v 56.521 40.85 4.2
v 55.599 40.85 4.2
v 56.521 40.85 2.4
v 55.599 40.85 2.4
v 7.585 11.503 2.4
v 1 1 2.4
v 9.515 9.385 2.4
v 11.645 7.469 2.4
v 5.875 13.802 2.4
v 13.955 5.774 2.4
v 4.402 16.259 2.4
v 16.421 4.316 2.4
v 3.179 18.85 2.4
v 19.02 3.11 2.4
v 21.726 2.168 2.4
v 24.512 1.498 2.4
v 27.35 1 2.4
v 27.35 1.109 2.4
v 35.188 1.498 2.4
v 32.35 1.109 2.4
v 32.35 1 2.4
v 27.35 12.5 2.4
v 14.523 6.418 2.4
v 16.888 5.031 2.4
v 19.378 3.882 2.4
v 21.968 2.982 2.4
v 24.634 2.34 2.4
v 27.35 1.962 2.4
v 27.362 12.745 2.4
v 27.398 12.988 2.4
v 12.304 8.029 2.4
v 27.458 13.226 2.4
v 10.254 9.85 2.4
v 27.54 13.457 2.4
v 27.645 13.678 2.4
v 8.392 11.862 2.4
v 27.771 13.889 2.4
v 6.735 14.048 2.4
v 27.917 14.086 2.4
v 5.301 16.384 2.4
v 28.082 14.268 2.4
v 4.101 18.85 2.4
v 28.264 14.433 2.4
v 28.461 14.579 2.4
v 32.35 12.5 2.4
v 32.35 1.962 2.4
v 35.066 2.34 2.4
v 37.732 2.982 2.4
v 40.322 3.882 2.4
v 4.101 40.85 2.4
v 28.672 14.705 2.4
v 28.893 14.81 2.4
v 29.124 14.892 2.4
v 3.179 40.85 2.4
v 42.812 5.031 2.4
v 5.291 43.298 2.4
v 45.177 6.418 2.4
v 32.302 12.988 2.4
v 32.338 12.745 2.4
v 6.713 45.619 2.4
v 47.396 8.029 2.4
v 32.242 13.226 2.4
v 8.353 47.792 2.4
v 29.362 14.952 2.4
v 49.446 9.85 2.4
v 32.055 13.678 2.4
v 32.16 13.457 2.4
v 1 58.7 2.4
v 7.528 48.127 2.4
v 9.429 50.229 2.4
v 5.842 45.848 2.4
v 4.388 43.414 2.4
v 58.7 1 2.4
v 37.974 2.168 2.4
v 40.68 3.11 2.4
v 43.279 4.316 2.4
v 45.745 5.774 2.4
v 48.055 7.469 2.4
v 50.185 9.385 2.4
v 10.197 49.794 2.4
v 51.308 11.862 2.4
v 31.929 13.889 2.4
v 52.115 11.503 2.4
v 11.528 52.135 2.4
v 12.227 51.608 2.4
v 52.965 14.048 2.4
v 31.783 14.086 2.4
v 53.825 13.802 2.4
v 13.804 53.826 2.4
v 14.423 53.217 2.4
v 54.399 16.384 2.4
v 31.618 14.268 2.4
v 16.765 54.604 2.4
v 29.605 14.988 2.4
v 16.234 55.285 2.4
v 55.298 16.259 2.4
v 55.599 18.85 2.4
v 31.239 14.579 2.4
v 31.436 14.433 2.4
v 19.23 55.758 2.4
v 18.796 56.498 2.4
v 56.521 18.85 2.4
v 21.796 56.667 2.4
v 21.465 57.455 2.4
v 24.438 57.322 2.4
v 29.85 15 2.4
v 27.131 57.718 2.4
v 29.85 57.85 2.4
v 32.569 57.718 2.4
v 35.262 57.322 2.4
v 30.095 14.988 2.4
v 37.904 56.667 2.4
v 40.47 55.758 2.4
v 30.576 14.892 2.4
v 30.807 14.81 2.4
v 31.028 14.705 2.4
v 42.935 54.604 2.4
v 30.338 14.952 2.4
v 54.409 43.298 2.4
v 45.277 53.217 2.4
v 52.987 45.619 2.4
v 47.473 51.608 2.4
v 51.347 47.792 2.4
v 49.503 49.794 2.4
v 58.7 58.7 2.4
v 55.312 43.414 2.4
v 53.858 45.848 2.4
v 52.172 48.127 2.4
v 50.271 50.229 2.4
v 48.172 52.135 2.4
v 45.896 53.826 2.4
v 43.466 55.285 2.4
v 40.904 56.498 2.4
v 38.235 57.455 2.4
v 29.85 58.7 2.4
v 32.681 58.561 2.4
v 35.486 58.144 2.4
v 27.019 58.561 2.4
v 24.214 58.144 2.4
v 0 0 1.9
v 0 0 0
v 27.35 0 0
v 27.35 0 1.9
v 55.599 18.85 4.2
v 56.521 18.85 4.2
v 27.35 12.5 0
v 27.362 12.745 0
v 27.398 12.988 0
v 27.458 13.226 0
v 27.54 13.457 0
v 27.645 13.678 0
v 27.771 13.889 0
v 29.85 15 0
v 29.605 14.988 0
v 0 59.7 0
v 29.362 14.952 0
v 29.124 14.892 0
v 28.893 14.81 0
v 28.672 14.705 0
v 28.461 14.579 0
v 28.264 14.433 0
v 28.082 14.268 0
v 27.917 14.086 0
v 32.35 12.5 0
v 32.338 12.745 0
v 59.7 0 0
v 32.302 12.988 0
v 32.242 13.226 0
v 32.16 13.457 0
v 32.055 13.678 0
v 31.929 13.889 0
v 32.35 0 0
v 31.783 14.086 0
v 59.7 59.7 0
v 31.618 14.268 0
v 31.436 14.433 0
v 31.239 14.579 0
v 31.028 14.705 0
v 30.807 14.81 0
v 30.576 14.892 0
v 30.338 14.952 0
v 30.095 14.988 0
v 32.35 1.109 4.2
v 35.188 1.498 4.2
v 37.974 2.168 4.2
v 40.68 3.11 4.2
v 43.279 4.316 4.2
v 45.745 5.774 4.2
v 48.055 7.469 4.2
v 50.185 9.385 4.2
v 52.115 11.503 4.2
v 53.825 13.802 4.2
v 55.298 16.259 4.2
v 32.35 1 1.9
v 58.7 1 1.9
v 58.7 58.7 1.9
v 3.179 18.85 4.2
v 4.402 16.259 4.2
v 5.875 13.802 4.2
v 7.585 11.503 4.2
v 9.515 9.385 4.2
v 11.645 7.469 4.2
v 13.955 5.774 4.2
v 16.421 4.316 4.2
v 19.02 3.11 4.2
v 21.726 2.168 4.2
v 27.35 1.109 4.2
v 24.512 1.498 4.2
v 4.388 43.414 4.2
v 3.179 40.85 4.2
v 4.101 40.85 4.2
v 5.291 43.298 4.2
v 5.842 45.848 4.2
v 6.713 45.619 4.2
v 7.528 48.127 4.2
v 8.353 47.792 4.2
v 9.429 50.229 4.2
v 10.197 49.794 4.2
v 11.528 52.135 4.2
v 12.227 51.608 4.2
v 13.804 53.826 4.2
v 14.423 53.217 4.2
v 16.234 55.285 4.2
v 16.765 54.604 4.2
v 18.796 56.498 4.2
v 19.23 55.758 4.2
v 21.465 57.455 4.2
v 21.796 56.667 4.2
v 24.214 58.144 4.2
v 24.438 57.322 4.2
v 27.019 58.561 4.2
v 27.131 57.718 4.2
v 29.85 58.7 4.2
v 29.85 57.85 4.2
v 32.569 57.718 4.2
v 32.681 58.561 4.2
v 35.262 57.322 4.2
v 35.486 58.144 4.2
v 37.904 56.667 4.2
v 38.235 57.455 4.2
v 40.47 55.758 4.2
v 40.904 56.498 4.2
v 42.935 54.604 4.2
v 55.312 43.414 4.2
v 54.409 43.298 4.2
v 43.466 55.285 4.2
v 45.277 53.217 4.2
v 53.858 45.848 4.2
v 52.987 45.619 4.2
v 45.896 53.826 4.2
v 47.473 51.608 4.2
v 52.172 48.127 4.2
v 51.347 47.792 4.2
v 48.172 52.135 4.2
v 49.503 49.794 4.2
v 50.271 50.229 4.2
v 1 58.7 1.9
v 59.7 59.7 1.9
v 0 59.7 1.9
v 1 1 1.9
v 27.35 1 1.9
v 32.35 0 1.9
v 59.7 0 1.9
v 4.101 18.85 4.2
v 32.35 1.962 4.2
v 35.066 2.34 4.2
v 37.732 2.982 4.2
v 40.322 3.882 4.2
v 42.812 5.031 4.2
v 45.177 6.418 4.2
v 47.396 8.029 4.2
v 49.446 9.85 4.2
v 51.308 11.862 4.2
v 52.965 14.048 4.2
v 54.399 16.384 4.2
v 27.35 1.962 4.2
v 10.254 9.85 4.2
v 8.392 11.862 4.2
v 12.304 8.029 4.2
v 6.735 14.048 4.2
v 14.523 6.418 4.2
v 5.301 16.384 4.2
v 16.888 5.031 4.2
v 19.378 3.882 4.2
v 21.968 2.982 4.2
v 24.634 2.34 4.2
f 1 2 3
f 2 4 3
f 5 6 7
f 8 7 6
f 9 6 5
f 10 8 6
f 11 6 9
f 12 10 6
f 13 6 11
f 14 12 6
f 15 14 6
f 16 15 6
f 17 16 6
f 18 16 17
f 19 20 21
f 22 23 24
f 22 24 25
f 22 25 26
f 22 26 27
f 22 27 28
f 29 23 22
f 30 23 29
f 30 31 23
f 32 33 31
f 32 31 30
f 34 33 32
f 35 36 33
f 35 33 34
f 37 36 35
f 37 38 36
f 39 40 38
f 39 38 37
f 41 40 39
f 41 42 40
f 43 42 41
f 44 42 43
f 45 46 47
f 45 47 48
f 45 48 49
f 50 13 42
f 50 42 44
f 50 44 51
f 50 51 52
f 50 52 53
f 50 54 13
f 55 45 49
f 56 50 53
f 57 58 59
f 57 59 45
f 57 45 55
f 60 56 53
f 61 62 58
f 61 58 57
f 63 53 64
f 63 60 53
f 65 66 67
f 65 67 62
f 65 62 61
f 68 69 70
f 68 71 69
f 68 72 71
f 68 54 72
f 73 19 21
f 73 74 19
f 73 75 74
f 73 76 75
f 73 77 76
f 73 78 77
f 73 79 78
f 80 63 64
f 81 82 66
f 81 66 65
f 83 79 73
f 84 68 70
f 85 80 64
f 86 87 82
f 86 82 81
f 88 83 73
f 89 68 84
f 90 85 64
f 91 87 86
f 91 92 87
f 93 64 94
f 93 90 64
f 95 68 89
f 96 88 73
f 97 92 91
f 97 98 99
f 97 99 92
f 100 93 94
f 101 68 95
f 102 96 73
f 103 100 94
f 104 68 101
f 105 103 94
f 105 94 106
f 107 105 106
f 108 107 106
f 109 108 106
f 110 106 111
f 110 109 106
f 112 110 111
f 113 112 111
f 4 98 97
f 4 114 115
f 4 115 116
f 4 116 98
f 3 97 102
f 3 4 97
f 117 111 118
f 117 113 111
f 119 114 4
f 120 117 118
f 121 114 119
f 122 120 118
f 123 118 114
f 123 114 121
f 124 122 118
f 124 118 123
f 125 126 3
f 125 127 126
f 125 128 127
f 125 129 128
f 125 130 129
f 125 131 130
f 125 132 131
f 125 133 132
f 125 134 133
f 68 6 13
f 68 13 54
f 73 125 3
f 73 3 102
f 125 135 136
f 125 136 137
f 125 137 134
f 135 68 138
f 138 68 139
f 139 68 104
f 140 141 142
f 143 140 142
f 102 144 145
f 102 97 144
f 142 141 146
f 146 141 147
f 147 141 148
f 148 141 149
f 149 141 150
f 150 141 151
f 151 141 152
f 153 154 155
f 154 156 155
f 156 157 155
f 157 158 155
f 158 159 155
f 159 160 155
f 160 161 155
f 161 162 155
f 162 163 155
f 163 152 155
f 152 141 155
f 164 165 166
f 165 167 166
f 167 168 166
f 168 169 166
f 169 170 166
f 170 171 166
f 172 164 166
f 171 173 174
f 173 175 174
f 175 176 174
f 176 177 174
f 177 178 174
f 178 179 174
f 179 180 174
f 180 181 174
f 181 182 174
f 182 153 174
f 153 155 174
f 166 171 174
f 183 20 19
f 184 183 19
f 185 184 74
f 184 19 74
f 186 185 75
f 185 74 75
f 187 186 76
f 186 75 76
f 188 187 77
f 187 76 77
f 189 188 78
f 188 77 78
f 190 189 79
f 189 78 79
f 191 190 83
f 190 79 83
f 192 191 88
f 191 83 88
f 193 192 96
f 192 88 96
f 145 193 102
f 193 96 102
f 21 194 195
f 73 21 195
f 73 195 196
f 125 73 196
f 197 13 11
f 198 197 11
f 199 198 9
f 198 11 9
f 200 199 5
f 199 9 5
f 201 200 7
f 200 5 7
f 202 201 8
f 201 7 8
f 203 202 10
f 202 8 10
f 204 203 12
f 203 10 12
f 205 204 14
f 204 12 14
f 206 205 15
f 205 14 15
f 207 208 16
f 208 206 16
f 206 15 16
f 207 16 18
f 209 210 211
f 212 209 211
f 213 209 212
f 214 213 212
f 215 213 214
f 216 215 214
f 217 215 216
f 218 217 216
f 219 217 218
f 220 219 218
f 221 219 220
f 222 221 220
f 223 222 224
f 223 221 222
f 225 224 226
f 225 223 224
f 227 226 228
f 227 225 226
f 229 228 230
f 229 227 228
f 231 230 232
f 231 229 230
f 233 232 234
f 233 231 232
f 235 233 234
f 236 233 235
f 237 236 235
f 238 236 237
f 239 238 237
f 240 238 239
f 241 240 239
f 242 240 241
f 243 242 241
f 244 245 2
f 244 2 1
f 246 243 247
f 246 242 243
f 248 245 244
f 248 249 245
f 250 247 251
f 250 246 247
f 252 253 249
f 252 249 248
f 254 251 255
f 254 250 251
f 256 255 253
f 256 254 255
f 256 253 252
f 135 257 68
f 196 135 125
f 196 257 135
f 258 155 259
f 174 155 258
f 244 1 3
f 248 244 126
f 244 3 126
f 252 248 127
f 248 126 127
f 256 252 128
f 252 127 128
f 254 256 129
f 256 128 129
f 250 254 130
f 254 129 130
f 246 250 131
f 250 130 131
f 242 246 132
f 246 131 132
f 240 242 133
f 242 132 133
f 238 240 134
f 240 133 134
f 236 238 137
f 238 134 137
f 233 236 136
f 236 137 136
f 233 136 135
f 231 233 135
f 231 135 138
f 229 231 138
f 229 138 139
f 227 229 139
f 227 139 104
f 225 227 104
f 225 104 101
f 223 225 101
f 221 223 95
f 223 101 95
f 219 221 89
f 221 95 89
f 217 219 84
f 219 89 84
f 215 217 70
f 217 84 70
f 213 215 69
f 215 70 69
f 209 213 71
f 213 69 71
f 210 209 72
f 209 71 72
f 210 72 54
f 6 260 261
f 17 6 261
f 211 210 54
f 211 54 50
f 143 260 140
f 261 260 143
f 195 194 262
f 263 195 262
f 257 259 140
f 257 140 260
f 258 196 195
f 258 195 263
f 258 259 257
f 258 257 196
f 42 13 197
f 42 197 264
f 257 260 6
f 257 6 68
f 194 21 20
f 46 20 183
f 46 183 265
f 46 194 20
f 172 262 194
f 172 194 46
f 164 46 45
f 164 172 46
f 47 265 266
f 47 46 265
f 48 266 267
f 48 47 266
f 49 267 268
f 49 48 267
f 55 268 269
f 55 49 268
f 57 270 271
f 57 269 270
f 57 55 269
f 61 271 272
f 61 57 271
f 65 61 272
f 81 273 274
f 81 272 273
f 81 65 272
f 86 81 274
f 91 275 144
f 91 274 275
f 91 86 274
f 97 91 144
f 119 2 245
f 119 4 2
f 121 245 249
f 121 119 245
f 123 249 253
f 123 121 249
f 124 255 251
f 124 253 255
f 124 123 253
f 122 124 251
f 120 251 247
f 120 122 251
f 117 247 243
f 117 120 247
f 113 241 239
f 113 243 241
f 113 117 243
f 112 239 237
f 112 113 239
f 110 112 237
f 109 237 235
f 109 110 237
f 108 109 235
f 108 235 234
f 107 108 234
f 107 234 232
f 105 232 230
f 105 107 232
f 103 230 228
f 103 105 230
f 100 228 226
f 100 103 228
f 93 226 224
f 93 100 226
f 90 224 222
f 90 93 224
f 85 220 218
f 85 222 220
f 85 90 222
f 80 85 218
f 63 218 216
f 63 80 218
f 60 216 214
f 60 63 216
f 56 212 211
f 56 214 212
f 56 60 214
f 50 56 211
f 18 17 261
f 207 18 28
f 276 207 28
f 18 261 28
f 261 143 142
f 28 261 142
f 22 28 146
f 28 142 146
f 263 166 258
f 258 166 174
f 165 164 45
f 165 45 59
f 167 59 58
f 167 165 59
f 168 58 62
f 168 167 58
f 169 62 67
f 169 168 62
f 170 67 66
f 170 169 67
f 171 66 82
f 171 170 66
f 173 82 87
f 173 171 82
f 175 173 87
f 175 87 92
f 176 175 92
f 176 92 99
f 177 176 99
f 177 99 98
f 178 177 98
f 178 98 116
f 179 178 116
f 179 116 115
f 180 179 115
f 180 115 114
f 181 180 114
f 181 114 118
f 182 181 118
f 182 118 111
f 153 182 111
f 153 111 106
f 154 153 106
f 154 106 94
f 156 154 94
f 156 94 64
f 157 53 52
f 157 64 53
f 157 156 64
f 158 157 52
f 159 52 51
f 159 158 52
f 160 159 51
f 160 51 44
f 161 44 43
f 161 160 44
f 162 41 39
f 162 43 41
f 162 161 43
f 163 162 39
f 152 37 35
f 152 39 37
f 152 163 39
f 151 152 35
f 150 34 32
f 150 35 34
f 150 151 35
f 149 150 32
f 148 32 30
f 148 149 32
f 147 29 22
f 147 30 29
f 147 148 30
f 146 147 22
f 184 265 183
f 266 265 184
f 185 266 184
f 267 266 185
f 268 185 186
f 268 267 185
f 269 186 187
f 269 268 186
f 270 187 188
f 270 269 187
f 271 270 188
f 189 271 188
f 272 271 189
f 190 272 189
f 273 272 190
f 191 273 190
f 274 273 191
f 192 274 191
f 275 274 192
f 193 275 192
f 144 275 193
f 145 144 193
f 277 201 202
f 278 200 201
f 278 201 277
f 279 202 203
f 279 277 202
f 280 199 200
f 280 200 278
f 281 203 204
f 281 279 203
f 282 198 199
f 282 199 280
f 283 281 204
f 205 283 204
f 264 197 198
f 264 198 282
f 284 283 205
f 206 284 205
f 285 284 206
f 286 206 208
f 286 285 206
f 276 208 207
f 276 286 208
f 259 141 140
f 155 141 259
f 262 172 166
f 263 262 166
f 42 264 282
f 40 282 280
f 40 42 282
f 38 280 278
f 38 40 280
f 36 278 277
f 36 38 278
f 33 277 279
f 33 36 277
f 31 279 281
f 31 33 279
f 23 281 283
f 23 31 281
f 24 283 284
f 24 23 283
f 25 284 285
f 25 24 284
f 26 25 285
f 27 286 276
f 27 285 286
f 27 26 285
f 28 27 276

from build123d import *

# Parameters (mm, degrees)
CYLINDER002_R     = 2.5
CYLINDER002_DEPTH = 5
BOX024_W          = 5
BOX024_H          = 12.5
BOX024_DEPTH      = 5
BOX001_W          = 57.7
BOX001_H          = 57.7
BOX001_DEPTH      = 0.5
BOX_W             = 59.7
BOX_H             = 59.7
BOX_DEPTH         = 1.9
BOX003_W          = 5
BOX003_H          = 22
BOX003_DEPTH      = 2.5
BOX002_W          = 5
BOX002_H          = 22
BOX002_DEPTH      = 2.5
CYLINDER001_R     = 28
CYLINDER001_DEPTH = 1.8
CYLINDER_R        = 28.85
CYLINDER_DEPTH    = 1.8


with BuildPart() as cylinder001:
    # Cylinder002 → Cylinder002 (new body)
    with BuildSketch(Plane(origin=(29.85, 12.5, 0), x_dir=(1, 0, 0), z_dir=(0, 0, 1))):
        Circle(CYLINDER002_R)
    extrude(amount=CYLINDER002_DEPTH)


with BuildPart() as cube:
    # Box024 → Box024 (new body)
    with BuildSketch(Plane(origin=(27.35, 0, 0), x_dir=(1, 0, 0), z_dir=(0, 0, 1))):
        with Locations((2.5, 6.25)):
            Rectangle(BOX024_W, BOX024_H)
    extrude(amount=BOX024_DEPTH)


with BuildPart() as layer_inside_base:
    # Box001 → Box001 (new body)
    with BuildSketch(Plane(origin=(1, 1, 1.9), x_dir=(1, 0, 0), z_dir=(0, 0, 1))):
        with Locations((28.85, 28.85)):
            Rectangle(BOX001_W, BOX001_H)
    extrude(amount=BOX001_DEPTH)


with BuildPart() as plate:
    # Box → Box (new body)
    with BuildSketch(Plane.XY):
        with Locations((29.85, 29.85)):
            Rectangle(BOX_W, BOX_H)
    extrude(amount=BOX_DEPTH)

    # Fusion: union Layer_Inside_Base
    add(layer_inside_base.part)


with BuildPart() as box003:
    # Box003 → Box003 (new body)
    with BuildSketch(Plane(origin=(54.7, 18.85, 1.9), x_dir=(1, 0, 0), z_dir=(0, 0, 1))):
        with Locations((2.5, 11)):
            Rectangle(BOX003_W, BOX003_H)
    extrude(amount=BOX003_DEPTH)


with BuildPart() as box002:
    # Box002 → Box002 (new body)
    with BuildSketch(Plane(origin=(0, 18.85, 1.9), x_dir=(1, 0, 0), z_dir=(0, 0, 1))):
        with Locations((2.5, 11)):
            Rectangle(BOX002_W, BOX002_H)
    extrude(amount=BOX002_DEPTH)


with BuildPart() as cylinder_inside:
    # Cylinder001 → Cylinder001 (new body)
    with BuildSketch(Plane(origin=(29.85, 29.85, 2.4), x_dir=(1, 0, 0), z_dir=(0, 0, 1))):
        Circle(CYLINDER001_R)
    extrude(amount=CYLINDER001_DEPTH)


with BuildPart() as cut006:
    # Cylinder → Cylinder (new body)
    with BuildSketch(Plane(origin=(29.85, 29.85, 2.4), x_dir=(1, 0, 0), z_dir=(0, 0, 1))):
        Circle(CYLINDER_R)
    extrude(amount=CYLINDER_DEPTH)

    # Cut: cut Cylinder_Inside
    add(cylinder_inside.part, mode=Mode.SUBTRACT)

    # Cut001: cut Box002
    add(box002.part, mode=Mode.SUBTRACT)

    # Cut002: cut Box003
    add(box003.part, mode=Mode.SUBTRACT)

    # Fusion001: union Plate
    add(plate.part)

    # Cut005: cut Cube
    add(cube.part, mode=Mode.SUBTRACT)

    # Cut006: cut Cylinder001
    add(cylinder001.part, mode=Mode.SUBTRACT)


solid = cut006.part
